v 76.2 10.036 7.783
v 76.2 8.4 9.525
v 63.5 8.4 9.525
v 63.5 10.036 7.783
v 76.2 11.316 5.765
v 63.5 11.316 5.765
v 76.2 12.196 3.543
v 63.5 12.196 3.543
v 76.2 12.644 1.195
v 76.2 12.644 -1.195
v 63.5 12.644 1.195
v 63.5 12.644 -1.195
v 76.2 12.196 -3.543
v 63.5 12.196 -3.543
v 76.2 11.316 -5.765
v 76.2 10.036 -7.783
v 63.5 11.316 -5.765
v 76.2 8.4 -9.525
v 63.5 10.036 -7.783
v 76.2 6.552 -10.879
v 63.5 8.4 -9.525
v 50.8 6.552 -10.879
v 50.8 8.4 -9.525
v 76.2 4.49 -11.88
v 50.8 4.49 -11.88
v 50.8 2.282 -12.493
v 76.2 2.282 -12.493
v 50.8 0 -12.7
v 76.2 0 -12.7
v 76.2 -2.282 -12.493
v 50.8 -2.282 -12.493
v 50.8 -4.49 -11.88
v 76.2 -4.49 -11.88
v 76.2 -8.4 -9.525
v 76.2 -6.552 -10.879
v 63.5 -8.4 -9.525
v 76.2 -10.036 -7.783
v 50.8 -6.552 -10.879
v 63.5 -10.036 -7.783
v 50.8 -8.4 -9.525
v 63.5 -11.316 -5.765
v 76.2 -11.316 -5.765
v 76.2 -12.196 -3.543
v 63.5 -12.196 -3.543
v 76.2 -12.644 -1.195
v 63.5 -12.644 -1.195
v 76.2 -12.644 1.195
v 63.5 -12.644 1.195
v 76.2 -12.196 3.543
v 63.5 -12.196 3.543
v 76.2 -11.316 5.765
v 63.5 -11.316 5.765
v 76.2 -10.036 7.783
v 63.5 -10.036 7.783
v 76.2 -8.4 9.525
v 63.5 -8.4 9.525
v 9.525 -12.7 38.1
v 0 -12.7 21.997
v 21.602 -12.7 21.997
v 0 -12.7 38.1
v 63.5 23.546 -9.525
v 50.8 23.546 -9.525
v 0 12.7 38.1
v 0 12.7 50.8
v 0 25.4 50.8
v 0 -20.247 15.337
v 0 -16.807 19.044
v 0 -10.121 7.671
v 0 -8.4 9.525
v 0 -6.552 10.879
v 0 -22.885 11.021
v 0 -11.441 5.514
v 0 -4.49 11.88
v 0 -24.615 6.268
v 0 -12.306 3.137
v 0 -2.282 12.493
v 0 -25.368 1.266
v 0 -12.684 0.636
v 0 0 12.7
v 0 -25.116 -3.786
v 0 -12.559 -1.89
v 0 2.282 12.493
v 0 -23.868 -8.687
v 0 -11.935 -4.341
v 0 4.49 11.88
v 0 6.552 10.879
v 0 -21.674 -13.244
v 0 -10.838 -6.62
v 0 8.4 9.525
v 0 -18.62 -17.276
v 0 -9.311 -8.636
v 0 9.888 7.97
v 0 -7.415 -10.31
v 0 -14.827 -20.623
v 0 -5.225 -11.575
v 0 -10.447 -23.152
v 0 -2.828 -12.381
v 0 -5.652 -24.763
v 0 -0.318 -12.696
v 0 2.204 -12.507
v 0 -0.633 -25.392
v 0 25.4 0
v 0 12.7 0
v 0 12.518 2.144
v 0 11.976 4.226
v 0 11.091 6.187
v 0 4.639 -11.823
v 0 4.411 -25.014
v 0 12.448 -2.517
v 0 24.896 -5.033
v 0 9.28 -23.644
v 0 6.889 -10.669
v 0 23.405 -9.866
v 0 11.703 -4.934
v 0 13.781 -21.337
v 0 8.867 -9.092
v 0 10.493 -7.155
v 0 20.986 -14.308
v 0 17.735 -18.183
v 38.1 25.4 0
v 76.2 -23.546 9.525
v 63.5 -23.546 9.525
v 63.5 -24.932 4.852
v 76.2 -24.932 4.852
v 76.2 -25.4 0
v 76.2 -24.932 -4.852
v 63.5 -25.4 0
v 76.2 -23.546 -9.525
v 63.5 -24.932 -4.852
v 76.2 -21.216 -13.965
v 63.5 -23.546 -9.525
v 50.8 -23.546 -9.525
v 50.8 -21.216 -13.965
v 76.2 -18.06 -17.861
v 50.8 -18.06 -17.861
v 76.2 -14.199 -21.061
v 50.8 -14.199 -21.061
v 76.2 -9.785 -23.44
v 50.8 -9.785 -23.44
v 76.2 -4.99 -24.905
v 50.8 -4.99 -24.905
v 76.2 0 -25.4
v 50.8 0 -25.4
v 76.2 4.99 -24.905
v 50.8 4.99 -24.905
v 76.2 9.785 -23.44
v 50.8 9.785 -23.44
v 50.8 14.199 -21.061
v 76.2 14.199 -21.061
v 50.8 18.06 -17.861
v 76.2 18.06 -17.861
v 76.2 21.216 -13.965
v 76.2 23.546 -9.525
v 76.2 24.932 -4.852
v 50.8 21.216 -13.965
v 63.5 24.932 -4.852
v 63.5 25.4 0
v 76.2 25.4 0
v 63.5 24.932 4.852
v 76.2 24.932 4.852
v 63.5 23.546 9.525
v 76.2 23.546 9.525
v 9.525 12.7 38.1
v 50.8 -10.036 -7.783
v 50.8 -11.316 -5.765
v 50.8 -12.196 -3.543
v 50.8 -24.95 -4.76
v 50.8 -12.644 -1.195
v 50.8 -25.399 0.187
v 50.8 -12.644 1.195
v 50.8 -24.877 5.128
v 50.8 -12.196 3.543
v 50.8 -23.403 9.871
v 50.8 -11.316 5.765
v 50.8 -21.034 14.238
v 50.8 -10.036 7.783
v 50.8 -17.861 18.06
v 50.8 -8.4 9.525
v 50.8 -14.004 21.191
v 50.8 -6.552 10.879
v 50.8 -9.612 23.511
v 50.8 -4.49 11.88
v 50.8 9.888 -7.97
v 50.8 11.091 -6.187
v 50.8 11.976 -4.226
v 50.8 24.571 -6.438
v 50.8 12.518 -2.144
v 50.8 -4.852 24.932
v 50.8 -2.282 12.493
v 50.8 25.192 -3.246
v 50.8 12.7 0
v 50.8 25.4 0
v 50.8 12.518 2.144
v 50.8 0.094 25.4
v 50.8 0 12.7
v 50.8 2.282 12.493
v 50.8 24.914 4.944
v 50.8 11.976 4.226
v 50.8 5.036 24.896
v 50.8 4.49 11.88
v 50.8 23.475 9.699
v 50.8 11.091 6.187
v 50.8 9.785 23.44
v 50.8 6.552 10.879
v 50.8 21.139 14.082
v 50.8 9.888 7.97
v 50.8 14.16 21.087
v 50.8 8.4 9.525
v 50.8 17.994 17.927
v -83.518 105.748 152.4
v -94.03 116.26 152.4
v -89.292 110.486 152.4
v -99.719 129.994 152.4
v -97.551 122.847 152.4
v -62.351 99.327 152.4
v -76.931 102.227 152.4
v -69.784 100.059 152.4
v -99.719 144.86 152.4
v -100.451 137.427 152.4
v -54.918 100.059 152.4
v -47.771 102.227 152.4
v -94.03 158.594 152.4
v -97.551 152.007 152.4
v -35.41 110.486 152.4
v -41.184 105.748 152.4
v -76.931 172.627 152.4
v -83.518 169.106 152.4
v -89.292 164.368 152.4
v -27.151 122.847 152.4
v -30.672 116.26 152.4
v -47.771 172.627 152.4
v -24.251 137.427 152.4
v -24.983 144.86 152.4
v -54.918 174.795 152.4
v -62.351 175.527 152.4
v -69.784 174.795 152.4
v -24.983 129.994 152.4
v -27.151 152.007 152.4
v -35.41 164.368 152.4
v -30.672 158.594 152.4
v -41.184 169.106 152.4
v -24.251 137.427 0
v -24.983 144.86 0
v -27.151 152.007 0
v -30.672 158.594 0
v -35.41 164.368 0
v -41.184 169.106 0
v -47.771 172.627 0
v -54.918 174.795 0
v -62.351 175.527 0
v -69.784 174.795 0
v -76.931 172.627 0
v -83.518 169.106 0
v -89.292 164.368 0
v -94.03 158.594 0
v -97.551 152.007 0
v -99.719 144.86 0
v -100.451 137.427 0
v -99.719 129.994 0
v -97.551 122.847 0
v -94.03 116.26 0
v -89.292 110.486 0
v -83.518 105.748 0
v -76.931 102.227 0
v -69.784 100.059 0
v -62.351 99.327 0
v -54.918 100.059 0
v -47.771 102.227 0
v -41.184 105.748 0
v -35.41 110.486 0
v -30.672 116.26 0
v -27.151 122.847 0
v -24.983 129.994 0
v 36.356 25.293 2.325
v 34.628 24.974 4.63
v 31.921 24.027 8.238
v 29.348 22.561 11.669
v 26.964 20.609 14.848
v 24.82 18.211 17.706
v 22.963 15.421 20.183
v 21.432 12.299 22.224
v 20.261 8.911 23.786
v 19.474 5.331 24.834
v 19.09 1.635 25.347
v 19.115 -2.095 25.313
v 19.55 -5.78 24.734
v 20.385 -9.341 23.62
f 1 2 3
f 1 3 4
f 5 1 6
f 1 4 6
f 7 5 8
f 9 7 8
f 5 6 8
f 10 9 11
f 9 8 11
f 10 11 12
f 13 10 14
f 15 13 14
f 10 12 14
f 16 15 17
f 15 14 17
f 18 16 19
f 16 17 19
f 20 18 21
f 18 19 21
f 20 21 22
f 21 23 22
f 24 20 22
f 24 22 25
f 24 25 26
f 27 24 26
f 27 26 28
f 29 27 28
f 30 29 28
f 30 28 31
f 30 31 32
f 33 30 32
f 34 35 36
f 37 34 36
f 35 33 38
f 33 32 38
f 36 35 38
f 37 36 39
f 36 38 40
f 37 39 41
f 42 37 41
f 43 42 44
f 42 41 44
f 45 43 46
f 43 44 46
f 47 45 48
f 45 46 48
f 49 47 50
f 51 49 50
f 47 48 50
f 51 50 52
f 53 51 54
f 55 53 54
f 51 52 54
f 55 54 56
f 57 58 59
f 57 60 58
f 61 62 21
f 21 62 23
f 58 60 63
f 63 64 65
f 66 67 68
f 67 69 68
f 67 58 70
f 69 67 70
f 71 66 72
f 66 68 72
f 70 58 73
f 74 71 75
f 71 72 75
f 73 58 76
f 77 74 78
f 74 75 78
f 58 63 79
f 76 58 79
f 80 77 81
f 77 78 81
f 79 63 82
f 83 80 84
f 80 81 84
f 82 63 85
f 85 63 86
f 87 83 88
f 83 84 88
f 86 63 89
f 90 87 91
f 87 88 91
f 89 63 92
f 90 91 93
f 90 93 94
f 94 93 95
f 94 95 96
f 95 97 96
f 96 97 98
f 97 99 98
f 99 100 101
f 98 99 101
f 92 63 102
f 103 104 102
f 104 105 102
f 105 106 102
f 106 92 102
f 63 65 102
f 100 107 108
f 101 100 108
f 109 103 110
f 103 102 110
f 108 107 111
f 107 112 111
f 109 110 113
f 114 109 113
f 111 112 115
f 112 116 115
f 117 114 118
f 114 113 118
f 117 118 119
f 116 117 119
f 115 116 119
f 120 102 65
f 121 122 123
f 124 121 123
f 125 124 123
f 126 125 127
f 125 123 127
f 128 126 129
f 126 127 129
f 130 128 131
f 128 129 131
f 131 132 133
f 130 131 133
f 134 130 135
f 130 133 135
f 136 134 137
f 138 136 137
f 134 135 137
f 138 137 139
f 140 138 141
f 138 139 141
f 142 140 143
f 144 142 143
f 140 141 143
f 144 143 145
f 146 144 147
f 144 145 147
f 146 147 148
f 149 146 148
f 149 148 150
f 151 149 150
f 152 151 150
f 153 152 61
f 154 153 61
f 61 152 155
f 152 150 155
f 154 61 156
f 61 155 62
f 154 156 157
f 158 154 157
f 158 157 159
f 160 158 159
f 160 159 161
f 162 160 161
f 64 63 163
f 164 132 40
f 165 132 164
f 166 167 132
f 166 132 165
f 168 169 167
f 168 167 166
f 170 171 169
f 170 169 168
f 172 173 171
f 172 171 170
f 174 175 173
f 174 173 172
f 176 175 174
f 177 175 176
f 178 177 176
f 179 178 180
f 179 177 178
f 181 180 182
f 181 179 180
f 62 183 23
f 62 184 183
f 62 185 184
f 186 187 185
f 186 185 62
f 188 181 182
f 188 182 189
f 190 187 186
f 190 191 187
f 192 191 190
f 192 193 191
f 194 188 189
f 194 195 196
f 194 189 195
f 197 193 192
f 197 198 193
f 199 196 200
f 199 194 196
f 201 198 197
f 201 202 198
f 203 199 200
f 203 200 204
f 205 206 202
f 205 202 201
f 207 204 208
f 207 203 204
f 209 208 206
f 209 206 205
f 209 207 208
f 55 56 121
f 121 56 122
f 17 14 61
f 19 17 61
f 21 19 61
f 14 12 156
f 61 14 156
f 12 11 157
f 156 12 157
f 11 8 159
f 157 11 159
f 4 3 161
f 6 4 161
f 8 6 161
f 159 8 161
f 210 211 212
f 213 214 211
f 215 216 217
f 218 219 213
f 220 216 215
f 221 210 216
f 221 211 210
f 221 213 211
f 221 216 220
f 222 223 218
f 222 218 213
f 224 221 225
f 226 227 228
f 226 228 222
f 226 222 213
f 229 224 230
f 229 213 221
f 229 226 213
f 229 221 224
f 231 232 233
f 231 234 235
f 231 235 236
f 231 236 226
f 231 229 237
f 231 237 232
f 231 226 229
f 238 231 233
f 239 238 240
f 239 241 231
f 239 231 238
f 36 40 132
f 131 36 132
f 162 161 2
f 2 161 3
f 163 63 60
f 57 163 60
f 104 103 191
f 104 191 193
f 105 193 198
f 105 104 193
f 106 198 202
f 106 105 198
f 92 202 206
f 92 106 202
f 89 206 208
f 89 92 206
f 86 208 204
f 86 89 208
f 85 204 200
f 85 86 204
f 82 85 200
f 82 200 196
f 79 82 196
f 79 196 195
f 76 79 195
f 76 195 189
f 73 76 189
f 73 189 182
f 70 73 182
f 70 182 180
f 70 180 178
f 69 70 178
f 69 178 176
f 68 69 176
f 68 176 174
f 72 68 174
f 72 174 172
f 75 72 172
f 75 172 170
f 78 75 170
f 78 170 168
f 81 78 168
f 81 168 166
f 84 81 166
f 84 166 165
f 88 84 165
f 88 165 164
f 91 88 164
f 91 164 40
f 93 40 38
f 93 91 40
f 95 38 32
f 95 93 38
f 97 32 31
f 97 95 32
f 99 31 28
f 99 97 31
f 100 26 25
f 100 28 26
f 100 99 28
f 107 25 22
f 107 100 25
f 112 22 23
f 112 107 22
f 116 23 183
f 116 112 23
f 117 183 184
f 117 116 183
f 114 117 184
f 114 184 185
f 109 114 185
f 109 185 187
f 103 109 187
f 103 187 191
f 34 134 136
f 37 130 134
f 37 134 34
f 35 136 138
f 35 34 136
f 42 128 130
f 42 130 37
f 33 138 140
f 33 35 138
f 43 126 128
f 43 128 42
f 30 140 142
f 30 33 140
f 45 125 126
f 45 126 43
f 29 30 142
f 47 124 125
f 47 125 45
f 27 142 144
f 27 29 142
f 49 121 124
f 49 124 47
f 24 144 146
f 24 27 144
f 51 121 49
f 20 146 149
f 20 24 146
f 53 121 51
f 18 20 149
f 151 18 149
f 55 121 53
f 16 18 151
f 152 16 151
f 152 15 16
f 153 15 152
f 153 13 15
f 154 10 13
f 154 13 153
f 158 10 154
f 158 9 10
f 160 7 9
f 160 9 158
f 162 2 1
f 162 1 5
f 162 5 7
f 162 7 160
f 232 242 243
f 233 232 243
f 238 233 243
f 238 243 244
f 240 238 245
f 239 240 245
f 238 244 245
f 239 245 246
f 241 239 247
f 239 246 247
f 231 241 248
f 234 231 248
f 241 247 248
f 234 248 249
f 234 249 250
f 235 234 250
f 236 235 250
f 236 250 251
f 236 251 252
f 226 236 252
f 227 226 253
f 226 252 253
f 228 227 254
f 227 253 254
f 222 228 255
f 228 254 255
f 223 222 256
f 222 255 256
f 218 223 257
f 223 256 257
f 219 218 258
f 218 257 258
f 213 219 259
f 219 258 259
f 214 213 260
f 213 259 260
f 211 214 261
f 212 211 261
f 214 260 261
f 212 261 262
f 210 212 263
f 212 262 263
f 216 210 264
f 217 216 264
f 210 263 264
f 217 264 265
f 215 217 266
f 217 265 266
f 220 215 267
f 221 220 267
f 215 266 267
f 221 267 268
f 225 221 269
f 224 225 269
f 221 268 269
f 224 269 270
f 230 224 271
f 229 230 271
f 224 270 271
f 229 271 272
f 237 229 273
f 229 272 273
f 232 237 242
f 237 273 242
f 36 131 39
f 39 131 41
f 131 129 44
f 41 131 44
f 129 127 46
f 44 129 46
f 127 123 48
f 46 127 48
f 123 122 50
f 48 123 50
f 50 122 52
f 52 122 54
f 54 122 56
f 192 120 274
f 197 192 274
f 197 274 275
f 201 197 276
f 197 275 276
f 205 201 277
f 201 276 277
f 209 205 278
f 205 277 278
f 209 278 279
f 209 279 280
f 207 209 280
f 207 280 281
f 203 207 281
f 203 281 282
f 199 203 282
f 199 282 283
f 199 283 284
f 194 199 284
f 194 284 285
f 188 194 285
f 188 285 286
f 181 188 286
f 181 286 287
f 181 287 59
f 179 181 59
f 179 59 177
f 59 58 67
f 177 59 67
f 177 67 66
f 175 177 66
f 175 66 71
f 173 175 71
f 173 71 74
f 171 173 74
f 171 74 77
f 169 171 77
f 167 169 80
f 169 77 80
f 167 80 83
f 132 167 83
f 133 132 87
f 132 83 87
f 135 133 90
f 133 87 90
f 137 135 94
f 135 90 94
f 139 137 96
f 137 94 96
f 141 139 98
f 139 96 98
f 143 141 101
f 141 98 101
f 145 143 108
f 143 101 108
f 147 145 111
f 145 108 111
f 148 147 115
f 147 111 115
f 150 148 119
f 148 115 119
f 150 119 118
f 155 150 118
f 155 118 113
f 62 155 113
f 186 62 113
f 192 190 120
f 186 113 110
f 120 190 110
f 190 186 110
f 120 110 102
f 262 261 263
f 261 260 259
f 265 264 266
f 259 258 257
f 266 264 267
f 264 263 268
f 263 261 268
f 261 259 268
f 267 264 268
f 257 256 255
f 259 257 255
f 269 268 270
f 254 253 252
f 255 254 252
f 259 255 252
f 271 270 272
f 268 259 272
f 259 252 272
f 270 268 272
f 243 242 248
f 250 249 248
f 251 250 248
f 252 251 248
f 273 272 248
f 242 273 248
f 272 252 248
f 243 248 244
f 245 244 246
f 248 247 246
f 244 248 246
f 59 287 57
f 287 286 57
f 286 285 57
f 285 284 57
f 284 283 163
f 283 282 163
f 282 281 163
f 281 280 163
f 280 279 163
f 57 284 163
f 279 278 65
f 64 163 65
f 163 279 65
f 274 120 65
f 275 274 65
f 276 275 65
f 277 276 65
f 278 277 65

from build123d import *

# Parameters (mm, degrees)
F0_R      = 25.4
F0_R_2    = 12.7
F1_DEPTH  = 50.8
F3_DEPTH  = 12.7
F5_DEPTH  = 12.7
F8_DEPTH  = 38.1
F9_DEPTH  = 50.801
F10_W     = 25.4
F10_H     = 12.7
F11_DEPTH = 25.4
F12_R     = 38.1
F13_DEPTH = 152.4


with BuildPart() as f1:
    # F0 (on Right) → F1 (new body)
    with BuildSketch(Plane.YZ):
        Circle(F0_R)
        Circle(F0_R_2, mode=Mode.SUBTRACT)
    extrude(amount=F1_DEPTH)

    # F2 (on face) → F3 (join)
    with BuildSketch(Plane.YZ.offset(50.8)):
        with BuildLine():
            Line((-8.4002604126, -9.525), (-23.5464301965, -9.525))
            ThreePointArc((-23.5464301965, -9.525), (0, -25.4), (23.5464301965, -9.525))
            Line((23.5464301965, -9.525), (8.4002604126, -9.525))
            ThreePointArc((8.4002604126, -9.525), (0, -12.7), (-8.4002604126, -9.525))
        make_face()
    extrude(amount=F3_DEPTH)

    # F4 (on face) → F5 (join)
    with BuildSketch(Plane.YZ.offset(63.5)):
        with BuildLine():
            Line((-8.4002604126, 9.525), (-23.5464301965, 9.525))
            ThreePointArc((-23.5464301965, 9.525), (-25.4, 0), (-23.5464301965, -9.525))
            Line((-23.5464301965, -9.525), (-8.4002604126, -9.525))
            ThreePointArc((-8.4002604126, -9.525), (-12.7, 0), (-8.4002604126, 9.525))
        make_face()
        with BuildLine():
            ThreePointArc((23.5464301965, -9.525), (25.4, 0), (23.5464301965, 9.525))
            Line((23.5464301965, 9.525), (8.4002604126, 9.525))
            ThreePointArc((8.4002604126, 9.525), (12.7, 0), (8.4002604126, -9.525))
            Line((8.4002604126, -9.525), (23.5464301965, -9.525))
        make_face()
        with BuildLine():
            Line((-8.4002604126, -9.525), (-23.5464301965, -9.525))
            ThreePointArc((-23.5464301965, -9.525), (0, -25.4), (23.5464301965, -9.525))
            Line((23.5464301965, -9.525), (8.4002604126, -9.525))
            ThreePointArc((8.4002604126, -9.525), (0, -12.7), (-8.4002604126, -9.525))
        make_face()
    extrude(amount=F5_DEPTH)

    # F7 (on offset) → F8 (join)
    with BuildSketch(Plane.XZ.offset(-25.4)):
        Polygon((0, 50.8), (0, 0), (38.1, 0), align=None)
    extrude(amount=F8_DEPTH)

    # F2 (on face) → F9 (cut, through all)
    with BuildSketch(Plane.YZ.offset(50.8)):
        with BuildLine():
            ThreePointArc((8.4002604126, 9.525), (0, 12.7), (-8.4002604126, 9.525))
            Line((-8.4002604126, 9.525), (8.4002604126, 9.525))
        make_face()
        with BuildLine():
            Line((8.4002604126, 9.525), (-8.4002604126, 9.525))
            ThreePointArc((-8.4002604126, 9.525), (-12.7, 0), (-8.4002604126, -9.525))
            Line((-8.4002604126, -9.525), (8.4002604126, -9.525))
            ThreePointArc((8.4002604126, -9.525), (11.5752604126, -5.2252604126), (12.7, 0))
            ThreePointArc((12.7, 0), (11.5752604126, 5.2252604126), (8.4002604126, 9.525))
        make_face()
    extrude(amount=-F9_DEPTH, mode=Mode.SUBTRACT)

    # F10 (on face) → F11 (cut)
    with BuildSketch(Plane(origin=(0, 0, 0), x_dir=(0, -1, 0), z_dir=(-1, 0, 0))):
        with Locations((0, 44.45)):
            Rectangle(F10_W, F10_H)
    extrude(amount=-F11_DEPTH, mode=Mode.SUBTRACT)


with BuildPart() as f13:
    # F12 (on Top) → F13 (new body)
    with BuildSketch(Plane.XY):
        with Locations((-62.3511075974, 137.4269872904)):
            Circle(F12_R)
    extrude(amount=F13_DEPTH)


solid = Compound([f1.part, f13.part])
